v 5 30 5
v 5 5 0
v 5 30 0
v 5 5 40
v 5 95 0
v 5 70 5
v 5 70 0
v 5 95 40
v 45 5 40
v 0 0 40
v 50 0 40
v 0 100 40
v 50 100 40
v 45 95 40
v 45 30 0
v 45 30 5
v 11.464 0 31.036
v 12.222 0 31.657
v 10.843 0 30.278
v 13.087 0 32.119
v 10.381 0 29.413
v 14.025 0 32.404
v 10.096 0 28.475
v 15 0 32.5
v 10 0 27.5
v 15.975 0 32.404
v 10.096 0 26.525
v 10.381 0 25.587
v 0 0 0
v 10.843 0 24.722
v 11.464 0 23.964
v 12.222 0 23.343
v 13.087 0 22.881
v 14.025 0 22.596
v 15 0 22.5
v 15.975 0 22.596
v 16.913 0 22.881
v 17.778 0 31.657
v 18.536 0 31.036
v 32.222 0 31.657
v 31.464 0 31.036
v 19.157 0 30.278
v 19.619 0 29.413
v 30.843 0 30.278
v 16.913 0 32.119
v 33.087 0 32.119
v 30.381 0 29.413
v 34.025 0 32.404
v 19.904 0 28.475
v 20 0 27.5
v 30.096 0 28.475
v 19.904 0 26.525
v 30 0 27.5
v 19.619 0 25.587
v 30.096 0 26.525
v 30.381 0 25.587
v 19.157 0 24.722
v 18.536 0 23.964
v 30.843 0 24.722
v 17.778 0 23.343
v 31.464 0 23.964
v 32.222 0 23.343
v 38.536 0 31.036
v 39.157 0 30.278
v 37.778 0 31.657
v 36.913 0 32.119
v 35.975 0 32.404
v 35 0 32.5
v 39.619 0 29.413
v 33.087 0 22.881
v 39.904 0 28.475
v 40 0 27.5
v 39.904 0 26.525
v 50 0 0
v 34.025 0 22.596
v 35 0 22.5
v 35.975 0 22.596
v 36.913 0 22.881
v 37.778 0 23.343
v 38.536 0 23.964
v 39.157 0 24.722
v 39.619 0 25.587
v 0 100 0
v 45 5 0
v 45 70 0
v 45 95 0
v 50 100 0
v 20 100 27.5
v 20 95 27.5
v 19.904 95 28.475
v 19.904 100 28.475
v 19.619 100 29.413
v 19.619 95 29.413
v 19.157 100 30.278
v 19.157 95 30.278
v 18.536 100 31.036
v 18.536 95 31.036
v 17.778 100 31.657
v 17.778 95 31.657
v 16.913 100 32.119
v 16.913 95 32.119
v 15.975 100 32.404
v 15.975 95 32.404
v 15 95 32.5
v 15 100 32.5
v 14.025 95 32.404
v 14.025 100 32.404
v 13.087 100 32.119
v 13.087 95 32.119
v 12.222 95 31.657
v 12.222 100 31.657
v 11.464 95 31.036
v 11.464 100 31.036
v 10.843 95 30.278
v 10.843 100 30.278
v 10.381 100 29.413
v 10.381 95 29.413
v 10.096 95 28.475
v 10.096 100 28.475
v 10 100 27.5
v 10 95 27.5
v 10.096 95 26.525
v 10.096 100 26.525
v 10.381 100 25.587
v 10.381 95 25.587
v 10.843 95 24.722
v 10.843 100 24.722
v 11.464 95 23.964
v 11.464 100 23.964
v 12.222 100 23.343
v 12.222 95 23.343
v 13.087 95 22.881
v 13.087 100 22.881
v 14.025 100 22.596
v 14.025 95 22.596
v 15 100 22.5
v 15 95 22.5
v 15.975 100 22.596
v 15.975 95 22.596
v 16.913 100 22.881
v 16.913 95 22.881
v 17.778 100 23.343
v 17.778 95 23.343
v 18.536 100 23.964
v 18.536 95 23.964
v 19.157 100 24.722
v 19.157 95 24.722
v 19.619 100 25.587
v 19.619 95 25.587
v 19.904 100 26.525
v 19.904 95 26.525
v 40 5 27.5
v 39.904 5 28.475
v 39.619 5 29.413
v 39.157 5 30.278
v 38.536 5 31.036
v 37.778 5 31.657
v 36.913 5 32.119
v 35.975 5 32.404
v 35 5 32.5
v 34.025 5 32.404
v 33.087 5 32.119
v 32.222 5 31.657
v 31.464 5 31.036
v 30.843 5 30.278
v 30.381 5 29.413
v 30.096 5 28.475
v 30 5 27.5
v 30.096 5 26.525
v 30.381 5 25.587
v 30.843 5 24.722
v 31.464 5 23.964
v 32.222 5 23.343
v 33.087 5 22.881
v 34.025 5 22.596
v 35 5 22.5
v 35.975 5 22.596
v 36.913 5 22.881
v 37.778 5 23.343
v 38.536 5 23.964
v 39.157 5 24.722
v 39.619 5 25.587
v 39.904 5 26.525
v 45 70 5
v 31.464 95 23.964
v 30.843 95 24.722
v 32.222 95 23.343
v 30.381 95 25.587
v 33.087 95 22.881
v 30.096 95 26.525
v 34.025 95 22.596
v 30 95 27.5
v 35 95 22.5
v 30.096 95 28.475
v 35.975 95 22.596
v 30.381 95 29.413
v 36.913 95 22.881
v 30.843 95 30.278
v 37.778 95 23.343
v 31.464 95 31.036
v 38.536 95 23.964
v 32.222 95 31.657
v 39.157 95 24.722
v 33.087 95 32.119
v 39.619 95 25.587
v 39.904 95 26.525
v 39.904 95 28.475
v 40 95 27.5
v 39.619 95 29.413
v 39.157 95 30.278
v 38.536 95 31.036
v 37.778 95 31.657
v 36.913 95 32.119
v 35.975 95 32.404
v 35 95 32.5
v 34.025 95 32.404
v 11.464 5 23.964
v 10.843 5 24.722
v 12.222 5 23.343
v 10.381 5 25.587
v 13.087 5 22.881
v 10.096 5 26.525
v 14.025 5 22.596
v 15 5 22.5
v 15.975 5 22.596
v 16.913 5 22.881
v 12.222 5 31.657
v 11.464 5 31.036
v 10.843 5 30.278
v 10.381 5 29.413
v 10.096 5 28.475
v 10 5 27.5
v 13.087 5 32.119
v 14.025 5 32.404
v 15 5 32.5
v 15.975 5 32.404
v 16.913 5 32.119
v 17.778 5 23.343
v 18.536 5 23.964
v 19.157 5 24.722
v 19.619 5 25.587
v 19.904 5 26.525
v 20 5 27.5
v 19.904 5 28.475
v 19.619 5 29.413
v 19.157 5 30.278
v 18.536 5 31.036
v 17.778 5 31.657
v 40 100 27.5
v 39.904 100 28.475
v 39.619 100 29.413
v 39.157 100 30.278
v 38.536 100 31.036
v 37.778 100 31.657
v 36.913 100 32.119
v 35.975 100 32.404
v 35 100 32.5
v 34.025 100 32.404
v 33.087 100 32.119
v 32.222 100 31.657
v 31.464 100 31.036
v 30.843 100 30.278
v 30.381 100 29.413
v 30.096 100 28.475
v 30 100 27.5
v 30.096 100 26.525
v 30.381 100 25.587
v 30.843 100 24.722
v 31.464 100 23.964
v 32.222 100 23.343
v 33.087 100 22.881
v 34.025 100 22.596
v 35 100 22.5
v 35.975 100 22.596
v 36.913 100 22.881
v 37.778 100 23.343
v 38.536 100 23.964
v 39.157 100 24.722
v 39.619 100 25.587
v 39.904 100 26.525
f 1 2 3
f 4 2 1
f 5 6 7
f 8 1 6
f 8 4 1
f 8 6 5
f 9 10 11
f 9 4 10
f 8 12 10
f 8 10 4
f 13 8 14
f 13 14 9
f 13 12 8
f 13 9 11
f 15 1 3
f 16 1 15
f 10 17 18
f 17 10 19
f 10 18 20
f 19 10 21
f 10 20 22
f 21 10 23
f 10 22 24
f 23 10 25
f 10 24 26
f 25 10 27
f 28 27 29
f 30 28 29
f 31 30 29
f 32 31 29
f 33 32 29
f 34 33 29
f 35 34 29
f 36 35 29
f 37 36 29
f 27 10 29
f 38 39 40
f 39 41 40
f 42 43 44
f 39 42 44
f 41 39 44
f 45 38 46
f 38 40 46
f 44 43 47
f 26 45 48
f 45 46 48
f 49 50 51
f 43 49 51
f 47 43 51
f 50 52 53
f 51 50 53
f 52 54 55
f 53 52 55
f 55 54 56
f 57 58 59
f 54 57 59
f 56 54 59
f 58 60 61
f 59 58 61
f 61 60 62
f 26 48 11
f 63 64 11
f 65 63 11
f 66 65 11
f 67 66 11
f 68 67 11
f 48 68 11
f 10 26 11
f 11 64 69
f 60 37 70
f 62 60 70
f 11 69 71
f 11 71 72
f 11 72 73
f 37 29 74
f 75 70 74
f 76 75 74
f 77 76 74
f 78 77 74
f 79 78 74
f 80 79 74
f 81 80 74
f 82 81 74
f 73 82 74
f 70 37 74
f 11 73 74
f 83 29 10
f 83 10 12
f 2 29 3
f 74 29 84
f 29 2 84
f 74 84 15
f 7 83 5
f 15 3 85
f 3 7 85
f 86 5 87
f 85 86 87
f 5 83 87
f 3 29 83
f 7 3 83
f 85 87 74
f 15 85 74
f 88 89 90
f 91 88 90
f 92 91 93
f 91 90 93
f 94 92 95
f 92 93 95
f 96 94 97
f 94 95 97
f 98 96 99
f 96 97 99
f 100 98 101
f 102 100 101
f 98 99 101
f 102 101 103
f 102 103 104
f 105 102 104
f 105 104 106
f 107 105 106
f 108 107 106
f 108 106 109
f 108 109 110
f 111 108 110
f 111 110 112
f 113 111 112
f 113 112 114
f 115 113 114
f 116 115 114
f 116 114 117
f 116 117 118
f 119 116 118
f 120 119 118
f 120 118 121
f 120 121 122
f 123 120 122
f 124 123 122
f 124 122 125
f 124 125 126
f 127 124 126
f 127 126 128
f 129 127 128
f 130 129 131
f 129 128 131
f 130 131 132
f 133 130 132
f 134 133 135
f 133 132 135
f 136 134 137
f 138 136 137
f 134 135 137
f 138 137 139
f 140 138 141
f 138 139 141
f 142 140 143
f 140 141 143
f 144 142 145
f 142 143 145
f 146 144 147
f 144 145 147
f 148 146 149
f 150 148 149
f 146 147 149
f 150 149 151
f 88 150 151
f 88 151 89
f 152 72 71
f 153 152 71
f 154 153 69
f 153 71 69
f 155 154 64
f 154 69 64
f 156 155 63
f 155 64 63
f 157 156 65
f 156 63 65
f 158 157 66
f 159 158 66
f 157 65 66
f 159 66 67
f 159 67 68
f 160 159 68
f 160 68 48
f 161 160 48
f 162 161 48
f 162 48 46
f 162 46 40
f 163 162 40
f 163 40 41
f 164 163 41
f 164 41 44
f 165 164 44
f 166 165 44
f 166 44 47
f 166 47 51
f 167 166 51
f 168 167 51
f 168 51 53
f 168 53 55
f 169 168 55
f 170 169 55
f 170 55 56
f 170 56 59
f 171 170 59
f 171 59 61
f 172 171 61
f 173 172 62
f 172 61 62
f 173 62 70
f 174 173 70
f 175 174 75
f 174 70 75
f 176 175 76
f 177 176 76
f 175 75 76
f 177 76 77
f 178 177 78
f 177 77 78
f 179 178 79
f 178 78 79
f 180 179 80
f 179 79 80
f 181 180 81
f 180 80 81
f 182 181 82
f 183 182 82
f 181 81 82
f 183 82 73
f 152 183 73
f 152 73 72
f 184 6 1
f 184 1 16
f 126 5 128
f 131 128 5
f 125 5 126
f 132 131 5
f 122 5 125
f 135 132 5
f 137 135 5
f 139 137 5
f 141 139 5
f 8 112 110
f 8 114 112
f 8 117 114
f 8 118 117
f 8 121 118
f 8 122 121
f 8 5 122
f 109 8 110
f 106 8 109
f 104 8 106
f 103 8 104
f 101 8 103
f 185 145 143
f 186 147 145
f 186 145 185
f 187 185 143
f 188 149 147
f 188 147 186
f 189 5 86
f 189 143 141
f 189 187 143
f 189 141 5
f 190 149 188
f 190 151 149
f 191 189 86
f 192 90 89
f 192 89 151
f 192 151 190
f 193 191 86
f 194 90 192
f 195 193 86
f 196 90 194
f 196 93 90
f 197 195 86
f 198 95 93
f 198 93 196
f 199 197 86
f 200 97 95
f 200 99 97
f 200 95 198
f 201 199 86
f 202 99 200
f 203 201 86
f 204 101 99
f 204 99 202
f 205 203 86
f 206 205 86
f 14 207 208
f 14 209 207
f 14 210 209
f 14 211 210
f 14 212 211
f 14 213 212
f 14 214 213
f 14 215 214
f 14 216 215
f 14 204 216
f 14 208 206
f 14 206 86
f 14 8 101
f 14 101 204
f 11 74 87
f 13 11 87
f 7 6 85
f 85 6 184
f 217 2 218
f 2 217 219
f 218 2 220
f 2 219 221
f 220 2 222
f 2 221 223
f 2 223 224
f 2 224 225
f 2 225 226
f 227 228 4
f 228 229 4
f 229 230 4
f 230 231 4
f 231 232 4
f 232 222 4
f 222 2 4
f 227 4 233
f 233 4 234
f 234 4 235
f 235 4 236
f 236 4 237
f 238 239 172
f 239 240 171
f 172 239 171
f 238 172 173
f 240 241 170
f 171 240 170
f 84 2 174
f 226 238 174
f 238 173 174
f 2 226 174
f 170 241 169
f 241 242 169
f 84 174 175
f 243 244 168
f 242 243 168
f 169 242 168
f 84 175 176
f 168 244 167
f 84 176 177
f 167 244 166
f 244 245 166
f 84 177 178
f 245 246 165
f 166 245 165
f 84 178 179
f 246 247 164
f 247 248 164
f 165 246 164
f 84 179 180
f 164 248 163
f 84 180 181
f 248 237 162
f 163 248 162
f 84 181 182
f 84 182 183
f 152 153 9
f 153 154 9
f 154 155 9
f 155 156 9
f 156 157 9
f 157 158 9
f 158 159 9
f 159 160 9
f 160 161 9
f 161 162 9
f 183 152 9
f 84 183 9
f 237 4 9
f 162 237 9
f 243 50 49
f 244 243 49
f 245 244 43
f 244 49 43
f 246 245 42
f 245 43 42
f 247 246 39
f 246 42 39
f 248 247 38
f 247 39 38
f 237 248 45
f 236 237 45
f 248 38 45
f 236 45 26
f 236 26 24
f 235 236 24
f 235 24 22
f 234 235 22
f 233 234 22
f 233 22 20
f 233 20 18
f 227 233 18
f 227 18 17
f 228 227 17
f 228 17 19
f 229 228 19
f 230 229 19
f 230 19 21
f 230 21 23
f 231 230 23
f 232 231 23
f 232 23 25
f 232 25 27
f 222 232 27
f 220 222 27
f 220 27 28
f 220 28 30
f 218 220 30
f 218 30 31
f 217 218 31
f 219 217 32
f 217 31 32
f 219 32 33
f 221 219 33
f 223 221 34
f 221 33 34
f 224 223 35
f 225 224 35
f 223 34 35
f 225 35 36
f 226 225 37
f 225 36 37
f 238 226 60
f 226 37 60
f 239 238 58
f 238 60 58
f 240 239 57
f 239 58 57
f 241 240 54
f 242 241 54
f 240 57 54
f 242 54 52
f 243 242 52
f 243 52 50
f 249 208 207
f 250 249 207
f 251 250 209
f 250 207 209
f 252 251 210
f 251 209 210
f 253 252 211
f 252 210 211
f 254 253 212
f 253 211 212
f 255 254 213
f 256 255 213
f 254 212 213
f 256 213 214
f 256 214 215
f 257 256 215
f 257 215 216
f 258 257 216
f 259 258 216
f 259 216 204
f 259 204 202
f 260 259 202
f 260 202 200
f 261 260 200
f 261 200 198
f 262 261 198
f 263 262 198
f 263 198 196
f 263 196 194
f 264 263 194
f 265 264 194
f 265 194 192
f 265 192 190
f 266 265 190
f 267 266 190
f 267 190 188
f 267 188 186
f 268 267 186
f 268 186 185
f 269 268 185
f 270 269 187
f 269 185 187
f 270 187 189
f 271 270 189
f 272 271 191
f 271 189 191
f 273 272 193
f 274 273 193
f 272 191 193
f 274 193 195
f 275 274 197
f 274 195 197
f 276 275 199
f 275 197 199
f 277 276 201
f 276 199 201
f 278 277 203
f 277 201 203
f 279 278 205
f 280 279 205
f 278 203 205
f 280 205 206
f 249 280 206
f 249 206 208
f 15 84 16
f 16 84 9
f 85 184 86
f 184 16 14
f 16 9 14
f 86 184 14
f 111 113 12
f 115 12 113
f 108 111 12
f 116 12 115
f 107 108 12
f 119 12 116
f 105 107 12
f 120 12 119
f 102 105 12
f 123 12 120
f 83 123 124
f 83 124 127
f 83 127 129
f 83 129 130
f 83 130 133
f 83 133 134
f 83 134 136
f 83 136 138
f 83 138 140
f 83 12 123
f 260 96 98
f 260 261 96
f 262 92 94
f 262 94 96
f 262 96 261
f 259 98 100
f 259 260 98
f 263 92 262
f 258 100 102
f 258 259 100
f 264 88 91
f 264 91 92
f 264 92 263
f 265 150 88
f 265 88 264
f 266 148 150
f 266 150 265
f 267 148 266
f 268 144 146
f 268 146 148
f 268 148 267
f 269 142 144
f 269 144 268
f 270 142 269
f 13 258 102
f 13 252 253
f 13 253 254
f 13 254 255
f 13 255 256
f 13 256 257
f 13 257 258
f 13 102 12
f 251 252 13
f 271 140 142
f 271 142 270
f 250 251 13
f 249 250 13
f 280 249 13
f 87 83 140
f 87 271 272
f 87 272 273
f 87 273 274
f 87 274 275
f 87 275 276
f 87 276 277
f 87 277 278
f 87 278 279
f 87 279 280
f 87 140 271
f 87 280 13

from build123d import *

# Parameters (mm, degrees)
SKETCH_W        = 50
SKETCH_H        = 100
PAD_DEPTH       = 40
SKETCH001_W     = 40
SKETCH001_H     = 90
POCKET_DEPTH    = 35
SKETCH002_W     = 40
SKETCH002_H     = 25
POCKET001_DEPTH = 5.001
SKETCH003_W     = 40
SKETCH003_H     = 25
POCKET002_DEPTH = 5.001
SKETCH004_R     = 5
POCKET003_DEPTH = 100.001


with BuildPart() as part:
    # Sketch → Pad (new body)
    with BuildSketch(Plane.XY):
        with Locations((25, 50)):
            Rectangle(SKETCH_W, SKETCH_H)
    extrude(amount=PAD_DEPTH)

    # Sketch001 (on Face6 of Pad) → Pocket (cut)
    with BuildSketch(Plane.XY.offset(40)):
        with Locations((25, 50)):
            Rectangle(SKETCH001_W, SKETCH001_H)
    extrude(amount=-POCKET_DEPTH, mode=Mode.SUBTRACT)

    # Sketch002 (on Face11 of Pocket) → Pocket001 (cut, through all)
    with BuildSketch(Plane.XY.offset(5)):
        with Locations((25, 82.5)):
            Rectangle(SKETCH002_W, SKETCH002_H)
    extrude(amount=-POCKET001_DEPTH, mode=Mode.SUBTRACT)

    # Sketch003 (on Face9 of Pocket001) → Pocket002 (cut, through all)
    with BuildSketch(Plane.XY.offset(5)):
        with Locations((25, 17.5)):
            Rectangle(SKETCH003_W, SKETCH003_H)
    extrude(amount=-POCKET002_DEPTH, mode=Mode.SUBTRACT)

    # Sketch004 (on Face1 of Pocket002) → Pocket003 (cut, through all)
    with BuildSketch(Plane.XZ):
        with Locations((15, 27.5)):
            Circle(SKETCH004_R)
        with Locations((35, 27.5)):
            Circle(SKETCH004_R)
    extrude(amount=-POCKET003_DEPTH, mode=Mode.SUBTRACT)


solid = part.part
